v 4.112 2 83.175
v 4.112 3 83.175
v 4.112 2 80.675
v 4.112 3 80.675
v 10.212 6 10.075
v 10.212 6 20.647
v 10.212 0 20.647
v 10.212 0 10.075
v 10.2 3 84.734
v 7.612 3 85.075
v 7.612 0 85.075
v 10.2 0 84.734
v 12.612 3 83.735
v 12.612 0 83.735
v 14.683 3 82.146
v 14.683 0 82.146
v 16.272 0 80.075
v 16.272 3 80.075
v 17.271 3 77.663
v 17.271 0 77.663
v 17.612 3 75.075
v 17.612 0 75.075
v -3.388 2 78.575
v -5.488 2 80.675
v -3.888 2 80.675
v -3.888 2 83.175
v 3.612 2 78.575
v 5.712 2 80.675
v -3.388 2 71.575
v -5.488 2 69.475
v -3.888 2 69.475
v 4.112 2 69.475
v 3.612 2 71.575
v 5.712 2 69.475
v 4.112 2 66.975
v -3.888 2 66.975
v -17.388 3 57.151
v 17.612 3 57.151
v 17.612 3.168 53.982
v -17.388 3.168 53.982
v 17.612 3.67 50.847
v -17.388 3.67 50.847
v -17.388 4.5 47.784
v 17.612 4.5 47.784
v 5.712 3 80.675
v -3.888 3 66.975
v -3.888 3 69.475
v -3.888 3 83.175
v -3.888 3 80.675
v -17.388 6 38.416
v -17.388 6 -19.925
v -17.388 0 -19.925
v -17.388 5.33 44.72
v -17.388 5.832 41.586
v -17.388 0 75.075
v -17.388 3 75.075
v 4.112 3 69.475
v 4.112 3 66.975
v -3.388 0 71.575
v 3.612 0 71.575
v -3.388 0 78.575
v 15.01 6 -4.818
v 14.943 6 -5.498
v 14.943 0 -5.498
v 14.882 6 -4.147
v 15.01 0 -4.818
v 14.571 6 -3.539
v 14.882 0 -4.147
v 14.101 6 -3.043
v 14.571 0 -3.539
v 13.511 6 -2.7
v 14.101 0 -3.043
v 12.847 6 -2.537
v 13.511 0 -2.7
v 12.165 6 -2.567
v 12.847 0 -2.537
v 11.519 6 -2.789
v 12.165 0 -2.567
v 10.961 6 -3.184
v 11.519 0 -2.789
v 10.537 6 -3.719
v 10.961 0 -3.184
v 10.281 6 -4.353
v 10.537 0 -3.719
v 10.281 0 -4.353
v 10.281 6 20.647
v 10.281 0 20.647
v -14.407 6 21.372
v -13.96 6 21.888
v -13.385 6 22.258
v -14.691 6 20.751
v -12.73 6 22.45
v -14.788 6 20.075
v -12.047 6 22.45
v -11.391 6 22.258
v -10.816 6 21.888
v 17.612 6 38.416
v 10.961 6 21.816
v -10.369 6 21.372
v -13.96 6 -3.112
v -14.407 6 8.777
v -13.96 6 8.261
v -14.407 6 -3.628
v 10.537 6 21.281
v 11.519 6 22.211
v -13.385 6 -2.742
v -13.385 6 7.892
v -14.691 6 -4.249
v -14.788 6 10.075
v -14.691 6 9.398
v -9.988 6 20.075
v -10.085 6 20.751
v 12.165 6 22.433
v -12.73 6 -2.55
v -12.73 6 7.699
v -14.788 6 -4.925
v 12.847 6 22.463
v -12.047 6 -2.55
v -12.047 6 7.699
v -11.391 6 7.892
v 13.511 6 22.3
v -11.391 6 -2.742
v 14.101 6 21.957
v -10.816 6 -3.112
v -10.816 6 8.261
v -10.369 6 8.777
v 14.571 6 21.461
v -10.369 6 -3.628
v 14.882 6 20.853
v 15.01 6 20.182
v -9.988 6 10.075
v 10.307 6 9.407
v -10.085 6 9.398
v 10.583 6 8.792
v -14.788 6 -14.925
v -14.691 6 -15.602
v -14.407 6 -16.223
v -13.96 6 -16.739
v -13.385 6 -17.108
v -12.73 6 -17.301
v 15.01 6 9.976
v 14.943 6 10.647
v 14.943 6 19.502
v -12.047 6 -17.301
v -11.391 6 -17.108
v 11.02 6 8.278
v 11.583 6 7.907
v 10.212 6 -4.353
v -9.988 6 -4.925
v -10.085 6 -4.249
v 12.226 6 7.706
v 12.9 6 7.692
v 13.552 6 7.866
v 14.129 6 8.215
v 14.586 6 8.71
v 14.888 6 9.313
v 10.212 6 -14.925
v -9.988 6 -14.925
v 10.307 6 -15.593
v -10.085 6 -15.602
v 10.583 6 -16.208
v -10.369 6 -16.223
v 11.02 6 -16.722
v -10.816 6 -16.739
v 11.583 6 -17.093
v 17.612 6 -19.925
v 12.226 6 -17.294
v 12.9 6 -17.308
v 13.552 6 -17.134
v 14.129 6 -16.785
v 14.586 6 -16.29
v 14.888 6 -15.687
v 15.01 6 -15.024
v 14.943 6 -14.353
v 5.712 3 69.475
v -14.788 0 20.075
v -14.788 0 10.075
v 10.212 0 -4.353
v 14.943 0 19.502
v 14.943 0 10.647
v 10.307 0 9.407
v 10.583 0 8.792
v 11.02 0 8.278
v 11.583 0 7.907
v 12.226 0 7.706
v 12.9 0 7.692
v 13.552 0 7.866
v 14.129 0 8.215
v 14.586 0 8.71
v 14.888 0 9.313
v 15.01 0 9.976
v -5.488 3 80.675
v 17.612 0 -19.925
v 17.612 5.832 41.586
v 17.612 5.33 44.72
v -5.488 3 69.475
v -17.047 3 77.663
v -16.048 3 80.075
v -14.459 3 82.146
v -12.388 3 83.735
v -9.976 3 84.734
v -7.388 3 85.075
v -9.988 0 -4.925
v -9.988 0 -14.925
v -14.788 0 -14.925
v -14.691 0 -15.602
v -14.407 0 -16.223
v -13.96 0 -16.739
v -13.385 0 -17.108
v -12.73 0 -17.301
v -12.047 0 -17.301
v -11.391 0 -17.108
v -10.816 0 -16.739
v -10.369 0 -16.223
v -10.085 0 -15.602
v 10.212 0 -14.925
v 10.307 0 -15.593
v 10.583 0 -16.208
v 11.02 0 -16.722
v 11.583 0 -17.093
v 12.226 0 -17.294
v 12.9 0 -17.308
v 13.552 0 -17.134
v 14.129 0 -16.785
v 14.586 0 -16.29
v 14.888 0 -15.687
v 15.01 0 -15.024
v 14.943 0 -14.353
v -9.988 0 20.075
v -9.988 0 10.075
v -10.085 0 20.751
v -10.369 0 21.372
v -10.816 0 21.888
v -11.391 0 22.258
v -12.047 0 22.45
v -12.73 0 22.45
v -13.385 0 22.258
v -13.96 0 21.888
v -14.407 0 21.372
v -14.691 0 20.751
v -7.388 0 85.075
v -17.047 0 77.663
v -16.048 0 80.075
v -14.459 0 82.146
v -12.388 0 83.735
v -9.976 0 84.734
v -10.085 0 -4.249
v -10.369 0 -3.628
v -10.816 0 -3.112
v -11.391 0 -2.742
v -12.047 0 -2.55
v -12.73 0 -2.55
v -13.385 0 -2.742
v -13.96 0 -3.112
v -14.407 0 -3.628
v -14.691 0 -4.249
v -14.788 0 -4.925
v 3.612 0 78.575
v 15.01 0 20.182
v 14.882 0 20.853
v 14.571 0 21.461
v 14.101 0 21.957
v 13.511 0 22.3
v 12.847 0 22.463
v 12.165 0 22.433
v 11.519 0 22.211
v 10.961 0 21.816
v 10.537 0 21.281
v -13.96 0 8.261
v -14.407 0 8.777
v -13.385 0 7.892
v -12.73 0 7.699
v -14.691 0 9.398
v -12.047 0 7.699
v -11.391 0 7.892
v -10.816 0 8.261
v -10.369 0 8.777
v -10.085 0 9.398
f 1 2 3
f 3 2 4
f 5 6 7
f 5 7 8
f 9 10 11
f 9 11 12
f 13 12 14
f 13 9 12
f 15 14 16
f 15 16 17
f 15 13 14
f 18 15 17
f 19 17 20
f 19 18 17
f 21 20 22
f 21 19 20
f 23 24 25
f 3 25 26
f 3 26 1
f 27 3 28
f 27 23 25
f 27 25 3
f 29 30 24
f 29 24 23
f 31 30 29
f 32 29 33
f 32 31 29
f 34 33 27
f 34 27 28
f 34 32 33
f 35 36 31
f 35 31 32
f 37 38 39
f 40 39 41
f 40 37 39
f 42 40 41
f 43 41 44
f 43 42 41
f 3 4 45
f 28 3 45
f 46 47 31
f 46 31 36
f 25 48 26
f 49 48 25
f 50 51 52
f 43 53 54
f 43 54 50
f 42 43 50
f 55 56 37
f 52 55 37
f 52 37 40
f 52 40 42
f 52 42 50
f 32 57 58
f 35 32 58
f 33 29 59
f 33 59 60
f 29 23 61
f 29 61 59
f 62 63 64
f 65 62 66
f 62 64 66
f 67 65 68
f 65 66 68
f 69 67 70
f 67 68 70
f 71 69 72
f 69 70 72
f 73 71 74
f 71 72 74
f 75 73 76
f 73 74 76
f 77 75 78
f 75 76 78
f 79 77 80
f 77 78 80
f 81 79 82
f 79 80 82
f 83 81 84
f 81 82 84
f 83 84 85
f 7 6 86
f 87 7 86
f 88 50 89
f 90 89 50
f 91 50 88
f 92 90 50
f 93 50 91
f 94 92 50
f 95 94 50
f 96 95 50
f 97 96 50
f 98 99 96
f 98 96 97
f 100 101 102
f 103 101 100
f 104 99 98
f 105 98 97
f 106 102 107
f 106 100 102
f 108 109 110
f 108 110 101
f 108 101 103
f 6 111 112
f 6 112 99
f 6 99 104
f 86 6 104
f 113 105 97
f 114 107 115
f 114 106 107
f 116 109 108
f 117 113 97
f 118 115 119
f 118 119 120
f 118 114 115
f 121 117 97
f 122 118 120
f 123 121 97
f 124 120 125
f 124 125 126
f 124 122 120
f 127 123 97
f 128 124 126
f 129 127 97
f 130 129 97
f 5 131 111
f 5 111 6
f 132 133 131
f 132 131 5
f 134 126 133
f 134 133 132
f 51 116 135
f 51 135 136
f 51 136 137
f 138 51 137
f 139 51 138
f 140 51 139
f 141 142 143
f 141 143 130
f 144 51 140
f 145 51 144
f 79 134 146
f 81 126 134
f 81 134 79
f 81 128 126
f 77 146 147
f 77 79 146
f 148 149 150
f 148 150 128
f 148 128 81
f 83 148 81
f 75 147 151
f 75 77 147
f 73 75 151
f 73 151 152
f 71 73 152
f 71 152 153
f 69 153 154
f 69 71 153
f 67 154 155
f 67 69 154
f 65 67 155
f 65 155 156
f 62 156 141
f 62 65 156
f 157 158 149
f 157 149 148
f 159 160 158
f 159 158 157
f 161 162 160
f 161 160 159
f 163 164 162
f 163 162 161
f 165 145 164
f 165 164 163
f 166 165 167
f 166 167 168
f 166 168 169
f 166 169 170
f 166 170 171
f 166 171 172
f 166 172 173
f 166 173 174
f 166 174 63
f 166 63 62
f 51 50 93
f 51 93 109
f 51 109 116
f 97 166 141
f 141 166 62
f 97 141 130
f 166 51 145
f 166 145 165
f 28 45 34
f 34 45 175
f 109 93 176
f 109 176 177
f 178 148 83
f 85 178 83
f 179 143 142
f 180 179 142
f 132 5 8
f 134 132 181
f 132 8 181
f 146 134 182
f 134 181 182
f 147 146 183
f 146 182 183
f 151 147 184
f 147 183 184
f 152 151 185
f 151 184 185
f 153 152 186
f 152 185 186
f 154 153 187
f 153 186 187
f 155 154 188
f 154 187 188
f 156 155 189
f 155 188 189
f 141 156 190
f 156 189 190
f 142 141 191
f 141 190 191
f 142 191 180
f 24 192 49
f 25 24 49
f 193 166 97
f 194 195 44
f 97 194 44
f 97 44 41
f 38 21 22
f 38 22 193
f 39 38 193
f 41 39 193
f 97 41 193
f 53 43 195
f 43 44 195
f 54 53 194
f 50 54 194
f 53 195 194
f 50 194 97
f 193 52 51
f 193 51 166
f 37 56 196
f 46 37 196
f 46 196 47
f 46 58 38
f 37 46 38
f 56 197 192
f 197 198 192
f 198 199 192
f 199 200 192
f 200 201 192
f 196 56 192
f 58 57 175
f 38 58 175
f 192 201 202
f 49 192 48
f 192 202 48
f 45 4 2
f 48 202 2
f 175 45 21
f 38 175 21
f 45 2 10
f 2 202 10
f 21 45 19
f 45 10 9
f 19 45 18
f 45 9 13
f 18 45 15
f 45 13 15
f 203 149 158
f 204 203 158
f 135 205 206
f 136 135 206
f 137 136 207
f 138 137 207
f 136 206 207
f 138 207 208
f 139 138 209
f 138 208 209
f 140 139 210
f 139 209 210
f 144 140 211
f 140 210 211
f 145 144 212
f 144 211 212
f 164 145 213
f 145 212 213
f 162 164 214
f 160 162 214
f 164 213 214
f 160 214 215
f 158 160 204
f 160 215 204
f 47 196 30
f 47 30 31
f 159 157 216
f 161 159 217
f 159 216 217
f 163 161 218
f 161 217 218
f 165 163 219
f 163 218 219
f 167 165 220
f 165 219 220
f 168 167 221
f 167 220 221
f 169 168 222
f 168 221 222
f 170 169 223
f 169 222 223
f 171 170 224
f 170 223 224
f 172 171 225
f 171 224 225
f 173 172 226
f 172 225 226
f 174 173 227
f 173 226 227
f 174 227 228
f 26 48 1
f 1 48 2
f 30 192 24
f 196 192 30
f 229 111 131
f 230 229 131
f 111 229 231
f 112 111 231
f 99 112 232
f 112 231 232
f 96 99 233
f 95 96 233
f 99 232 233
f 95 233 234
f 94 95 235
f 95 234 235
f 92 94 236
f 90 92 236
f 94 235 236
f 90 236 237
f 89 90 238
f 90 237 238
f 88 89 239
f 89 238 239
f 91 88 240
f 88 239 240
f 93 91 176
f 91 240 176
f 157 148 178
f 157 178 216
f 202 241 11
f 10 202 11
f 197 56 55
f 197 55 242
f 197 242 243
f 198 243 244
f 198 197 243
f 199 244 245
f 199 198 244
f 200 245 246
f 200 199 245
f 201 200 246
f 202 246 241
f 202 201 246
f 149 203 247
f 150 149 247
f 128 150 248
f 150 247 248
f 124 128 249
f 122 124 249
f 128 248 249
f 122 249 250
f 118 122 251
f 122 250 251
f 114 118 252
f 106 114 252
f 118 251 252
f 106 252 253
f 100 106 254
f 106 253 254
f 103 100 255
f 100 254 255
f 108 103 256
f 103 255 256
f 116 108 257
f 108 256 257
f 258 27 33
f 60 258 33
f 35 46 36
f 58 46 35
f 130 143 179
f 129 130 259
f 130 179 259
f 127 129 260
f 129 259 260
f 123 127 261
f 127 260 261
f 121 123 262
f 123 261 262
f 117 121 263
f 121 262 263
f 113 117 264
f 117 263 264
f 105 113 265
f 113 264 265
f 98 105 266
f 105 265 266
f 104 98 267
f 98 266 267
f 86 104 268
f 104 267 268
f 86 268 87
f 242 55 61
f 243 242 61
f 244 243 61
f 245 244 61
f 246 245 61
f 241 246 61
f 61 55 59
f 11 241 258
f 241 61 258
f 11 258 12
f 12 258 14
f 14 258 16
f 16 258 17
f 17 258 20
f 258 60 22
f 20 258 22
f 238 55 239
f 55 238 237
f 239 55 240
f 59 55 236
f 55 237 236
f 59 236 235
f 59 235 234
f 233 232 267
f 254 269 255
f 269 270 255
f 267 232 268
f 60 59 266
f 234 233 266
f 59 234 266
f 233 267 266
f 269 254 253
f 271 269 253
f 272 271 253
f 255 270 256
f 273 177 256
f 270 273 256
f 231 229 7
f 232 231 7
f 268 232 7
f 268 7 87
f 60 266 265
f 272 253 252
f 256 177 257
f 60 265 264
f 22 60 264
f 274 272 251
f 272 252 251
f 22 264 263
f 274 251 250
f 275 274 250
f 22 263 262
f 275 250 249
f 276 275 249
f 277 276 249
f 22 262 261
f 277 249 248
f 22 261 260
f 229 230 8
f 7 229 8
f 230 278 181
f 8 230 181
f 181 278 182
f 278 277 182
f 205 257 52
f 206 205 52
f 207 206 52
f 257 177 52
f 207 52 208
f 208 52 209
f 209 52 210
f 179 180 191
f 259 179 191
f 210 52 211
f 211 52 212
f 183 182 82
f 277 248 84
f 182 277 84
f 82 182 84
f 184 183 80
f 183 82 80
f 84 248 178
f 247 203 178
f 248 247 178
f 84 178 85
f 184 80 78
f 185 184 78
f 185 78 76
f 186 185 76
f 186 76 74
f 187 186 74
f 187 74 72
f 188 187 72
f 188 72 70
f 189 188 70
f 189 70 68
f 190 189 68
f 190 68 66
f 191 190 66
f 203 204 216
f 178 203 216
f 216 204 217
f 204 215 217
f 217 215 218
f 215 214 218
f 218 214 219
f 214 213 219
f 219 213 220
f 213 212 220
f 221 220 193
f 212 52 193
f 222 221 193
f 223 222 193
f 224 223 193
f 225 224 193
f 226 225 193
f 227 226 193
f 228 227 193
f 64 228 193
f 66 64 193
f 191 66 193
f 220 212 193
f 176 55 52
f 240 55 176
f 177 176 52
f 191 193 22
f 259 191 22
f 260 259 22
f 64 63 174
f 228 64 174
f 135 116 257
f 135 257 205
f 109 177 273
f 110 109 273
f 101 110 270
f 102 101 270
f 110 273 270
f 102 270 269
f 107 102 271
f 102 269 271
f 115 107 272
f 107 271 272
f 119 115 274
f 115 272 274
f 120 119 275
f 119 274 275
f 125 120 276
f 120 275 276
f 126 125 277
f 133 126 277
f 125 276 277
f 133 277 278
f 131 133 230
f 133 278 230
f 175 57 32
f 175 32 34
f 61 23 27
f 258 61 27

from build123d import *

# Parameters (mm, degrees)
SKETCH1_W            = 35
SKETCH1_H            = 105
BOSS_EXTRUDE1_DEPTH  = 6
M4_CLEARANCE_HOLE1_D = 4.8
LPATTERN2_COUNT      = 2
LPATTERN2_PITCH      = 10
SKETCH5_W            = 4.8
SKETCH5_H            = 10
SKETCH5_W_2          = 4.730666207
SKETCH5_H_2          = 10.572708501
CUT_EXTRUDE1_DEPTH   = 88.085432636
SKETCH6_W            = 11.2
SKETCH6_H            = 11.2
CUT_EXTRUDE2_DEPTH   = 4
SKETCH7_W            = 7
SKETCH7_H            = 7
CUT_EXTRUDE3_DEPTH   = 87.970527062
SKETCH8_W            = 8
SKETCH8_H            = 16.2
CUT_EXTRUDE4_DEPTH   = 4
FILLET1_R            = 10
CUT_EXTRUDE5_START   = -6
SKETCH9_W            = 37.049954943
SKETCH9_H            = 41
CUT_EXTRUDE5_DEPTH   = 3
FILLET2_R            = 30
FILLET3_R            = 30


with BuildPart() as part:
    # Sketch1 → Boss-Extrude1 (new body)
    with BuildSketch(Plane(origin=(0, 0, 0), x_dir=(1, 0, 0), z_dir=(0, 1, 0))):
        with Locations((0.111940299, -32.574626866)):
            Rectangle(SKETCH1_W, SKETCH1_H)
    extrude(amount=BOSS_EXTRUDE1_DEPTH)

    # M4 Clearance Hole1 (through all)
    with Locations(Plane(origin=(0, 6, 0), x_dir=(1, 0, 0), z_dir=(0, 1, 0))):
        with Locations((-12.388059701, 14.925373134), (12.611940299, 14.925373134), (12.611940299, -10.074626866), (-12.388059701, -10.074626866)):
            m4_clearance_hole1 = Hole(M4_CLEARANCE_HOLE1_D / 2)

    # LPattern2: M4 Clearance Hole1 ×2
    with Locations(*[(0, 0, i * LPATTERN2_PITCH) for i in range(1, LPATTERN2_COUNT)]):
        add(m4_clearance_hole1, mode=Mode.SUBTRACT)

    # Sketch5 → Cut-Extrude1 (cut, through all)
    with BuildSketch(Plane(origin=(0, 6, 0), x_dir=(1, 0, 0), z_dir=(0, 1, 0))):
        with Locations((-12.388059701, 9.925373134)):
            Rectangle(SKETCH5_W, SKETCH5_H)
        with Locations((-12.388059701, -15.074626866)):
            Rectangle(SKETCH5_W, SKETCH5_H)
        with Locations((12.577273403, 9.639018884)):
            Rectangle(SKETCH5_W_2, SKETCH5_H_2)
        with Locations((12.577273403, -15.360981116)):
            Rectangle(SKETCH5_W_2, SKETCH5_H_2)
    extrude(amount=-CUT_EXTRUDE1_DEPTH, mode=Mode.SUBTRACT)

    # Sketch6 → Cut-Extrude2 (cut)
    with BuildSketch(Plane(origin=(0, 6, 0), x_dir=(1, 0, 0), z_dir=(0, 1, 0))):
        with Locations((0.111940299, -75.074626866)):
            Rectangle(SKETCH6_W, SKETCH6_H)
    extrude(amount=-CUT_EXTRUDE2_DEPTH, mode=Mode.SUBTRACT)

    # Sketch7 → Cut-Extrude3 (cut, through all)
    with BuildSketch(Plane(origin=(0, 2, 0), x_dir=(1, 0, 0), z_dir=(0, 1, 0))):
        with Locations((0.111940299, -75.074626866)):
            Rectangle(SKETCH7_W, SKETCH7_H)
    extrude(amount=-CUT_EXTRUDE3_DEPTH, mode=Mode.SUBTRACT)

    # Sketch8 → Cut-Extrude4 (cut)
    with BuildSketch(Plane(origin=(0, 6, 0), x_dir=(1, 0, 0), z_dir=(0, 1, 0))):
        with Locations((0.111940299, -75.074626866)):
            Rectangle(SKETCH8_W, SKETCH8_H)
    extrude(amount=-CUT_EXTRUDE4_DEPTH, mode=Mode.SUBTRACT)

    # Fillet1
    fillet1_edges = [part.edges().sort_by_distance(p)[0] for p in [
        (17.611940299, 3, 85.074626866),
        (-17.388059701, 3, 85.074626866),
    ]]
    fillet(fillet1_edges, radius=FILLET1_R)

    # Sketch9 → Cut-Extrude5 (cut)
    with BuildSketch(Plane.XZ.offset(CUT_EXTRUDE5_START)):
        with Locations((1.136917771, 64.574626866)):
            Rectangle(SKETCH9_W, SKETCH9_H)
    extrude(amount=CUT_EXTRUDE5_DEPTH, mode=Mode.SUBTRACT)

    # Fillet2
    # the kernel refuses this fillet: 30 mm, written as the material it adds along each edge
    with BuildSketch(Plane(origin=(-17.388059701, 3, 44.074626866), x_dir=(0, 1, 0), z_dir=(1, 0, 0))) as fillet2_piece_1:
        with BuildLine():
            CenterArc((30, 13.076696831), FILLET2_R, 180, 25.841932763)
            Line((0, 13.076696831), (-0.6, 13.076696831))
            Line((-0.6, 13.076696831), (-0.6, 0))
            Line((-0.6, 0), (0, -0.6))
            ThreePointArc((0, -0.6), (1.5, -0.6), (2.46, -0.261533937))
            Line((2.46, -0.261533937), (3, 0))
        make_face()
    extrude(amount=35)

    # Fillet3
    fillet3_edges = [part.edges().sort_by_distance(p)[0] for p in [
        (0.111940299, 6, 44.074626866),
    ]]
    fillet(fillet3_edges, radius=FILLET3_R)


solid = part.part
